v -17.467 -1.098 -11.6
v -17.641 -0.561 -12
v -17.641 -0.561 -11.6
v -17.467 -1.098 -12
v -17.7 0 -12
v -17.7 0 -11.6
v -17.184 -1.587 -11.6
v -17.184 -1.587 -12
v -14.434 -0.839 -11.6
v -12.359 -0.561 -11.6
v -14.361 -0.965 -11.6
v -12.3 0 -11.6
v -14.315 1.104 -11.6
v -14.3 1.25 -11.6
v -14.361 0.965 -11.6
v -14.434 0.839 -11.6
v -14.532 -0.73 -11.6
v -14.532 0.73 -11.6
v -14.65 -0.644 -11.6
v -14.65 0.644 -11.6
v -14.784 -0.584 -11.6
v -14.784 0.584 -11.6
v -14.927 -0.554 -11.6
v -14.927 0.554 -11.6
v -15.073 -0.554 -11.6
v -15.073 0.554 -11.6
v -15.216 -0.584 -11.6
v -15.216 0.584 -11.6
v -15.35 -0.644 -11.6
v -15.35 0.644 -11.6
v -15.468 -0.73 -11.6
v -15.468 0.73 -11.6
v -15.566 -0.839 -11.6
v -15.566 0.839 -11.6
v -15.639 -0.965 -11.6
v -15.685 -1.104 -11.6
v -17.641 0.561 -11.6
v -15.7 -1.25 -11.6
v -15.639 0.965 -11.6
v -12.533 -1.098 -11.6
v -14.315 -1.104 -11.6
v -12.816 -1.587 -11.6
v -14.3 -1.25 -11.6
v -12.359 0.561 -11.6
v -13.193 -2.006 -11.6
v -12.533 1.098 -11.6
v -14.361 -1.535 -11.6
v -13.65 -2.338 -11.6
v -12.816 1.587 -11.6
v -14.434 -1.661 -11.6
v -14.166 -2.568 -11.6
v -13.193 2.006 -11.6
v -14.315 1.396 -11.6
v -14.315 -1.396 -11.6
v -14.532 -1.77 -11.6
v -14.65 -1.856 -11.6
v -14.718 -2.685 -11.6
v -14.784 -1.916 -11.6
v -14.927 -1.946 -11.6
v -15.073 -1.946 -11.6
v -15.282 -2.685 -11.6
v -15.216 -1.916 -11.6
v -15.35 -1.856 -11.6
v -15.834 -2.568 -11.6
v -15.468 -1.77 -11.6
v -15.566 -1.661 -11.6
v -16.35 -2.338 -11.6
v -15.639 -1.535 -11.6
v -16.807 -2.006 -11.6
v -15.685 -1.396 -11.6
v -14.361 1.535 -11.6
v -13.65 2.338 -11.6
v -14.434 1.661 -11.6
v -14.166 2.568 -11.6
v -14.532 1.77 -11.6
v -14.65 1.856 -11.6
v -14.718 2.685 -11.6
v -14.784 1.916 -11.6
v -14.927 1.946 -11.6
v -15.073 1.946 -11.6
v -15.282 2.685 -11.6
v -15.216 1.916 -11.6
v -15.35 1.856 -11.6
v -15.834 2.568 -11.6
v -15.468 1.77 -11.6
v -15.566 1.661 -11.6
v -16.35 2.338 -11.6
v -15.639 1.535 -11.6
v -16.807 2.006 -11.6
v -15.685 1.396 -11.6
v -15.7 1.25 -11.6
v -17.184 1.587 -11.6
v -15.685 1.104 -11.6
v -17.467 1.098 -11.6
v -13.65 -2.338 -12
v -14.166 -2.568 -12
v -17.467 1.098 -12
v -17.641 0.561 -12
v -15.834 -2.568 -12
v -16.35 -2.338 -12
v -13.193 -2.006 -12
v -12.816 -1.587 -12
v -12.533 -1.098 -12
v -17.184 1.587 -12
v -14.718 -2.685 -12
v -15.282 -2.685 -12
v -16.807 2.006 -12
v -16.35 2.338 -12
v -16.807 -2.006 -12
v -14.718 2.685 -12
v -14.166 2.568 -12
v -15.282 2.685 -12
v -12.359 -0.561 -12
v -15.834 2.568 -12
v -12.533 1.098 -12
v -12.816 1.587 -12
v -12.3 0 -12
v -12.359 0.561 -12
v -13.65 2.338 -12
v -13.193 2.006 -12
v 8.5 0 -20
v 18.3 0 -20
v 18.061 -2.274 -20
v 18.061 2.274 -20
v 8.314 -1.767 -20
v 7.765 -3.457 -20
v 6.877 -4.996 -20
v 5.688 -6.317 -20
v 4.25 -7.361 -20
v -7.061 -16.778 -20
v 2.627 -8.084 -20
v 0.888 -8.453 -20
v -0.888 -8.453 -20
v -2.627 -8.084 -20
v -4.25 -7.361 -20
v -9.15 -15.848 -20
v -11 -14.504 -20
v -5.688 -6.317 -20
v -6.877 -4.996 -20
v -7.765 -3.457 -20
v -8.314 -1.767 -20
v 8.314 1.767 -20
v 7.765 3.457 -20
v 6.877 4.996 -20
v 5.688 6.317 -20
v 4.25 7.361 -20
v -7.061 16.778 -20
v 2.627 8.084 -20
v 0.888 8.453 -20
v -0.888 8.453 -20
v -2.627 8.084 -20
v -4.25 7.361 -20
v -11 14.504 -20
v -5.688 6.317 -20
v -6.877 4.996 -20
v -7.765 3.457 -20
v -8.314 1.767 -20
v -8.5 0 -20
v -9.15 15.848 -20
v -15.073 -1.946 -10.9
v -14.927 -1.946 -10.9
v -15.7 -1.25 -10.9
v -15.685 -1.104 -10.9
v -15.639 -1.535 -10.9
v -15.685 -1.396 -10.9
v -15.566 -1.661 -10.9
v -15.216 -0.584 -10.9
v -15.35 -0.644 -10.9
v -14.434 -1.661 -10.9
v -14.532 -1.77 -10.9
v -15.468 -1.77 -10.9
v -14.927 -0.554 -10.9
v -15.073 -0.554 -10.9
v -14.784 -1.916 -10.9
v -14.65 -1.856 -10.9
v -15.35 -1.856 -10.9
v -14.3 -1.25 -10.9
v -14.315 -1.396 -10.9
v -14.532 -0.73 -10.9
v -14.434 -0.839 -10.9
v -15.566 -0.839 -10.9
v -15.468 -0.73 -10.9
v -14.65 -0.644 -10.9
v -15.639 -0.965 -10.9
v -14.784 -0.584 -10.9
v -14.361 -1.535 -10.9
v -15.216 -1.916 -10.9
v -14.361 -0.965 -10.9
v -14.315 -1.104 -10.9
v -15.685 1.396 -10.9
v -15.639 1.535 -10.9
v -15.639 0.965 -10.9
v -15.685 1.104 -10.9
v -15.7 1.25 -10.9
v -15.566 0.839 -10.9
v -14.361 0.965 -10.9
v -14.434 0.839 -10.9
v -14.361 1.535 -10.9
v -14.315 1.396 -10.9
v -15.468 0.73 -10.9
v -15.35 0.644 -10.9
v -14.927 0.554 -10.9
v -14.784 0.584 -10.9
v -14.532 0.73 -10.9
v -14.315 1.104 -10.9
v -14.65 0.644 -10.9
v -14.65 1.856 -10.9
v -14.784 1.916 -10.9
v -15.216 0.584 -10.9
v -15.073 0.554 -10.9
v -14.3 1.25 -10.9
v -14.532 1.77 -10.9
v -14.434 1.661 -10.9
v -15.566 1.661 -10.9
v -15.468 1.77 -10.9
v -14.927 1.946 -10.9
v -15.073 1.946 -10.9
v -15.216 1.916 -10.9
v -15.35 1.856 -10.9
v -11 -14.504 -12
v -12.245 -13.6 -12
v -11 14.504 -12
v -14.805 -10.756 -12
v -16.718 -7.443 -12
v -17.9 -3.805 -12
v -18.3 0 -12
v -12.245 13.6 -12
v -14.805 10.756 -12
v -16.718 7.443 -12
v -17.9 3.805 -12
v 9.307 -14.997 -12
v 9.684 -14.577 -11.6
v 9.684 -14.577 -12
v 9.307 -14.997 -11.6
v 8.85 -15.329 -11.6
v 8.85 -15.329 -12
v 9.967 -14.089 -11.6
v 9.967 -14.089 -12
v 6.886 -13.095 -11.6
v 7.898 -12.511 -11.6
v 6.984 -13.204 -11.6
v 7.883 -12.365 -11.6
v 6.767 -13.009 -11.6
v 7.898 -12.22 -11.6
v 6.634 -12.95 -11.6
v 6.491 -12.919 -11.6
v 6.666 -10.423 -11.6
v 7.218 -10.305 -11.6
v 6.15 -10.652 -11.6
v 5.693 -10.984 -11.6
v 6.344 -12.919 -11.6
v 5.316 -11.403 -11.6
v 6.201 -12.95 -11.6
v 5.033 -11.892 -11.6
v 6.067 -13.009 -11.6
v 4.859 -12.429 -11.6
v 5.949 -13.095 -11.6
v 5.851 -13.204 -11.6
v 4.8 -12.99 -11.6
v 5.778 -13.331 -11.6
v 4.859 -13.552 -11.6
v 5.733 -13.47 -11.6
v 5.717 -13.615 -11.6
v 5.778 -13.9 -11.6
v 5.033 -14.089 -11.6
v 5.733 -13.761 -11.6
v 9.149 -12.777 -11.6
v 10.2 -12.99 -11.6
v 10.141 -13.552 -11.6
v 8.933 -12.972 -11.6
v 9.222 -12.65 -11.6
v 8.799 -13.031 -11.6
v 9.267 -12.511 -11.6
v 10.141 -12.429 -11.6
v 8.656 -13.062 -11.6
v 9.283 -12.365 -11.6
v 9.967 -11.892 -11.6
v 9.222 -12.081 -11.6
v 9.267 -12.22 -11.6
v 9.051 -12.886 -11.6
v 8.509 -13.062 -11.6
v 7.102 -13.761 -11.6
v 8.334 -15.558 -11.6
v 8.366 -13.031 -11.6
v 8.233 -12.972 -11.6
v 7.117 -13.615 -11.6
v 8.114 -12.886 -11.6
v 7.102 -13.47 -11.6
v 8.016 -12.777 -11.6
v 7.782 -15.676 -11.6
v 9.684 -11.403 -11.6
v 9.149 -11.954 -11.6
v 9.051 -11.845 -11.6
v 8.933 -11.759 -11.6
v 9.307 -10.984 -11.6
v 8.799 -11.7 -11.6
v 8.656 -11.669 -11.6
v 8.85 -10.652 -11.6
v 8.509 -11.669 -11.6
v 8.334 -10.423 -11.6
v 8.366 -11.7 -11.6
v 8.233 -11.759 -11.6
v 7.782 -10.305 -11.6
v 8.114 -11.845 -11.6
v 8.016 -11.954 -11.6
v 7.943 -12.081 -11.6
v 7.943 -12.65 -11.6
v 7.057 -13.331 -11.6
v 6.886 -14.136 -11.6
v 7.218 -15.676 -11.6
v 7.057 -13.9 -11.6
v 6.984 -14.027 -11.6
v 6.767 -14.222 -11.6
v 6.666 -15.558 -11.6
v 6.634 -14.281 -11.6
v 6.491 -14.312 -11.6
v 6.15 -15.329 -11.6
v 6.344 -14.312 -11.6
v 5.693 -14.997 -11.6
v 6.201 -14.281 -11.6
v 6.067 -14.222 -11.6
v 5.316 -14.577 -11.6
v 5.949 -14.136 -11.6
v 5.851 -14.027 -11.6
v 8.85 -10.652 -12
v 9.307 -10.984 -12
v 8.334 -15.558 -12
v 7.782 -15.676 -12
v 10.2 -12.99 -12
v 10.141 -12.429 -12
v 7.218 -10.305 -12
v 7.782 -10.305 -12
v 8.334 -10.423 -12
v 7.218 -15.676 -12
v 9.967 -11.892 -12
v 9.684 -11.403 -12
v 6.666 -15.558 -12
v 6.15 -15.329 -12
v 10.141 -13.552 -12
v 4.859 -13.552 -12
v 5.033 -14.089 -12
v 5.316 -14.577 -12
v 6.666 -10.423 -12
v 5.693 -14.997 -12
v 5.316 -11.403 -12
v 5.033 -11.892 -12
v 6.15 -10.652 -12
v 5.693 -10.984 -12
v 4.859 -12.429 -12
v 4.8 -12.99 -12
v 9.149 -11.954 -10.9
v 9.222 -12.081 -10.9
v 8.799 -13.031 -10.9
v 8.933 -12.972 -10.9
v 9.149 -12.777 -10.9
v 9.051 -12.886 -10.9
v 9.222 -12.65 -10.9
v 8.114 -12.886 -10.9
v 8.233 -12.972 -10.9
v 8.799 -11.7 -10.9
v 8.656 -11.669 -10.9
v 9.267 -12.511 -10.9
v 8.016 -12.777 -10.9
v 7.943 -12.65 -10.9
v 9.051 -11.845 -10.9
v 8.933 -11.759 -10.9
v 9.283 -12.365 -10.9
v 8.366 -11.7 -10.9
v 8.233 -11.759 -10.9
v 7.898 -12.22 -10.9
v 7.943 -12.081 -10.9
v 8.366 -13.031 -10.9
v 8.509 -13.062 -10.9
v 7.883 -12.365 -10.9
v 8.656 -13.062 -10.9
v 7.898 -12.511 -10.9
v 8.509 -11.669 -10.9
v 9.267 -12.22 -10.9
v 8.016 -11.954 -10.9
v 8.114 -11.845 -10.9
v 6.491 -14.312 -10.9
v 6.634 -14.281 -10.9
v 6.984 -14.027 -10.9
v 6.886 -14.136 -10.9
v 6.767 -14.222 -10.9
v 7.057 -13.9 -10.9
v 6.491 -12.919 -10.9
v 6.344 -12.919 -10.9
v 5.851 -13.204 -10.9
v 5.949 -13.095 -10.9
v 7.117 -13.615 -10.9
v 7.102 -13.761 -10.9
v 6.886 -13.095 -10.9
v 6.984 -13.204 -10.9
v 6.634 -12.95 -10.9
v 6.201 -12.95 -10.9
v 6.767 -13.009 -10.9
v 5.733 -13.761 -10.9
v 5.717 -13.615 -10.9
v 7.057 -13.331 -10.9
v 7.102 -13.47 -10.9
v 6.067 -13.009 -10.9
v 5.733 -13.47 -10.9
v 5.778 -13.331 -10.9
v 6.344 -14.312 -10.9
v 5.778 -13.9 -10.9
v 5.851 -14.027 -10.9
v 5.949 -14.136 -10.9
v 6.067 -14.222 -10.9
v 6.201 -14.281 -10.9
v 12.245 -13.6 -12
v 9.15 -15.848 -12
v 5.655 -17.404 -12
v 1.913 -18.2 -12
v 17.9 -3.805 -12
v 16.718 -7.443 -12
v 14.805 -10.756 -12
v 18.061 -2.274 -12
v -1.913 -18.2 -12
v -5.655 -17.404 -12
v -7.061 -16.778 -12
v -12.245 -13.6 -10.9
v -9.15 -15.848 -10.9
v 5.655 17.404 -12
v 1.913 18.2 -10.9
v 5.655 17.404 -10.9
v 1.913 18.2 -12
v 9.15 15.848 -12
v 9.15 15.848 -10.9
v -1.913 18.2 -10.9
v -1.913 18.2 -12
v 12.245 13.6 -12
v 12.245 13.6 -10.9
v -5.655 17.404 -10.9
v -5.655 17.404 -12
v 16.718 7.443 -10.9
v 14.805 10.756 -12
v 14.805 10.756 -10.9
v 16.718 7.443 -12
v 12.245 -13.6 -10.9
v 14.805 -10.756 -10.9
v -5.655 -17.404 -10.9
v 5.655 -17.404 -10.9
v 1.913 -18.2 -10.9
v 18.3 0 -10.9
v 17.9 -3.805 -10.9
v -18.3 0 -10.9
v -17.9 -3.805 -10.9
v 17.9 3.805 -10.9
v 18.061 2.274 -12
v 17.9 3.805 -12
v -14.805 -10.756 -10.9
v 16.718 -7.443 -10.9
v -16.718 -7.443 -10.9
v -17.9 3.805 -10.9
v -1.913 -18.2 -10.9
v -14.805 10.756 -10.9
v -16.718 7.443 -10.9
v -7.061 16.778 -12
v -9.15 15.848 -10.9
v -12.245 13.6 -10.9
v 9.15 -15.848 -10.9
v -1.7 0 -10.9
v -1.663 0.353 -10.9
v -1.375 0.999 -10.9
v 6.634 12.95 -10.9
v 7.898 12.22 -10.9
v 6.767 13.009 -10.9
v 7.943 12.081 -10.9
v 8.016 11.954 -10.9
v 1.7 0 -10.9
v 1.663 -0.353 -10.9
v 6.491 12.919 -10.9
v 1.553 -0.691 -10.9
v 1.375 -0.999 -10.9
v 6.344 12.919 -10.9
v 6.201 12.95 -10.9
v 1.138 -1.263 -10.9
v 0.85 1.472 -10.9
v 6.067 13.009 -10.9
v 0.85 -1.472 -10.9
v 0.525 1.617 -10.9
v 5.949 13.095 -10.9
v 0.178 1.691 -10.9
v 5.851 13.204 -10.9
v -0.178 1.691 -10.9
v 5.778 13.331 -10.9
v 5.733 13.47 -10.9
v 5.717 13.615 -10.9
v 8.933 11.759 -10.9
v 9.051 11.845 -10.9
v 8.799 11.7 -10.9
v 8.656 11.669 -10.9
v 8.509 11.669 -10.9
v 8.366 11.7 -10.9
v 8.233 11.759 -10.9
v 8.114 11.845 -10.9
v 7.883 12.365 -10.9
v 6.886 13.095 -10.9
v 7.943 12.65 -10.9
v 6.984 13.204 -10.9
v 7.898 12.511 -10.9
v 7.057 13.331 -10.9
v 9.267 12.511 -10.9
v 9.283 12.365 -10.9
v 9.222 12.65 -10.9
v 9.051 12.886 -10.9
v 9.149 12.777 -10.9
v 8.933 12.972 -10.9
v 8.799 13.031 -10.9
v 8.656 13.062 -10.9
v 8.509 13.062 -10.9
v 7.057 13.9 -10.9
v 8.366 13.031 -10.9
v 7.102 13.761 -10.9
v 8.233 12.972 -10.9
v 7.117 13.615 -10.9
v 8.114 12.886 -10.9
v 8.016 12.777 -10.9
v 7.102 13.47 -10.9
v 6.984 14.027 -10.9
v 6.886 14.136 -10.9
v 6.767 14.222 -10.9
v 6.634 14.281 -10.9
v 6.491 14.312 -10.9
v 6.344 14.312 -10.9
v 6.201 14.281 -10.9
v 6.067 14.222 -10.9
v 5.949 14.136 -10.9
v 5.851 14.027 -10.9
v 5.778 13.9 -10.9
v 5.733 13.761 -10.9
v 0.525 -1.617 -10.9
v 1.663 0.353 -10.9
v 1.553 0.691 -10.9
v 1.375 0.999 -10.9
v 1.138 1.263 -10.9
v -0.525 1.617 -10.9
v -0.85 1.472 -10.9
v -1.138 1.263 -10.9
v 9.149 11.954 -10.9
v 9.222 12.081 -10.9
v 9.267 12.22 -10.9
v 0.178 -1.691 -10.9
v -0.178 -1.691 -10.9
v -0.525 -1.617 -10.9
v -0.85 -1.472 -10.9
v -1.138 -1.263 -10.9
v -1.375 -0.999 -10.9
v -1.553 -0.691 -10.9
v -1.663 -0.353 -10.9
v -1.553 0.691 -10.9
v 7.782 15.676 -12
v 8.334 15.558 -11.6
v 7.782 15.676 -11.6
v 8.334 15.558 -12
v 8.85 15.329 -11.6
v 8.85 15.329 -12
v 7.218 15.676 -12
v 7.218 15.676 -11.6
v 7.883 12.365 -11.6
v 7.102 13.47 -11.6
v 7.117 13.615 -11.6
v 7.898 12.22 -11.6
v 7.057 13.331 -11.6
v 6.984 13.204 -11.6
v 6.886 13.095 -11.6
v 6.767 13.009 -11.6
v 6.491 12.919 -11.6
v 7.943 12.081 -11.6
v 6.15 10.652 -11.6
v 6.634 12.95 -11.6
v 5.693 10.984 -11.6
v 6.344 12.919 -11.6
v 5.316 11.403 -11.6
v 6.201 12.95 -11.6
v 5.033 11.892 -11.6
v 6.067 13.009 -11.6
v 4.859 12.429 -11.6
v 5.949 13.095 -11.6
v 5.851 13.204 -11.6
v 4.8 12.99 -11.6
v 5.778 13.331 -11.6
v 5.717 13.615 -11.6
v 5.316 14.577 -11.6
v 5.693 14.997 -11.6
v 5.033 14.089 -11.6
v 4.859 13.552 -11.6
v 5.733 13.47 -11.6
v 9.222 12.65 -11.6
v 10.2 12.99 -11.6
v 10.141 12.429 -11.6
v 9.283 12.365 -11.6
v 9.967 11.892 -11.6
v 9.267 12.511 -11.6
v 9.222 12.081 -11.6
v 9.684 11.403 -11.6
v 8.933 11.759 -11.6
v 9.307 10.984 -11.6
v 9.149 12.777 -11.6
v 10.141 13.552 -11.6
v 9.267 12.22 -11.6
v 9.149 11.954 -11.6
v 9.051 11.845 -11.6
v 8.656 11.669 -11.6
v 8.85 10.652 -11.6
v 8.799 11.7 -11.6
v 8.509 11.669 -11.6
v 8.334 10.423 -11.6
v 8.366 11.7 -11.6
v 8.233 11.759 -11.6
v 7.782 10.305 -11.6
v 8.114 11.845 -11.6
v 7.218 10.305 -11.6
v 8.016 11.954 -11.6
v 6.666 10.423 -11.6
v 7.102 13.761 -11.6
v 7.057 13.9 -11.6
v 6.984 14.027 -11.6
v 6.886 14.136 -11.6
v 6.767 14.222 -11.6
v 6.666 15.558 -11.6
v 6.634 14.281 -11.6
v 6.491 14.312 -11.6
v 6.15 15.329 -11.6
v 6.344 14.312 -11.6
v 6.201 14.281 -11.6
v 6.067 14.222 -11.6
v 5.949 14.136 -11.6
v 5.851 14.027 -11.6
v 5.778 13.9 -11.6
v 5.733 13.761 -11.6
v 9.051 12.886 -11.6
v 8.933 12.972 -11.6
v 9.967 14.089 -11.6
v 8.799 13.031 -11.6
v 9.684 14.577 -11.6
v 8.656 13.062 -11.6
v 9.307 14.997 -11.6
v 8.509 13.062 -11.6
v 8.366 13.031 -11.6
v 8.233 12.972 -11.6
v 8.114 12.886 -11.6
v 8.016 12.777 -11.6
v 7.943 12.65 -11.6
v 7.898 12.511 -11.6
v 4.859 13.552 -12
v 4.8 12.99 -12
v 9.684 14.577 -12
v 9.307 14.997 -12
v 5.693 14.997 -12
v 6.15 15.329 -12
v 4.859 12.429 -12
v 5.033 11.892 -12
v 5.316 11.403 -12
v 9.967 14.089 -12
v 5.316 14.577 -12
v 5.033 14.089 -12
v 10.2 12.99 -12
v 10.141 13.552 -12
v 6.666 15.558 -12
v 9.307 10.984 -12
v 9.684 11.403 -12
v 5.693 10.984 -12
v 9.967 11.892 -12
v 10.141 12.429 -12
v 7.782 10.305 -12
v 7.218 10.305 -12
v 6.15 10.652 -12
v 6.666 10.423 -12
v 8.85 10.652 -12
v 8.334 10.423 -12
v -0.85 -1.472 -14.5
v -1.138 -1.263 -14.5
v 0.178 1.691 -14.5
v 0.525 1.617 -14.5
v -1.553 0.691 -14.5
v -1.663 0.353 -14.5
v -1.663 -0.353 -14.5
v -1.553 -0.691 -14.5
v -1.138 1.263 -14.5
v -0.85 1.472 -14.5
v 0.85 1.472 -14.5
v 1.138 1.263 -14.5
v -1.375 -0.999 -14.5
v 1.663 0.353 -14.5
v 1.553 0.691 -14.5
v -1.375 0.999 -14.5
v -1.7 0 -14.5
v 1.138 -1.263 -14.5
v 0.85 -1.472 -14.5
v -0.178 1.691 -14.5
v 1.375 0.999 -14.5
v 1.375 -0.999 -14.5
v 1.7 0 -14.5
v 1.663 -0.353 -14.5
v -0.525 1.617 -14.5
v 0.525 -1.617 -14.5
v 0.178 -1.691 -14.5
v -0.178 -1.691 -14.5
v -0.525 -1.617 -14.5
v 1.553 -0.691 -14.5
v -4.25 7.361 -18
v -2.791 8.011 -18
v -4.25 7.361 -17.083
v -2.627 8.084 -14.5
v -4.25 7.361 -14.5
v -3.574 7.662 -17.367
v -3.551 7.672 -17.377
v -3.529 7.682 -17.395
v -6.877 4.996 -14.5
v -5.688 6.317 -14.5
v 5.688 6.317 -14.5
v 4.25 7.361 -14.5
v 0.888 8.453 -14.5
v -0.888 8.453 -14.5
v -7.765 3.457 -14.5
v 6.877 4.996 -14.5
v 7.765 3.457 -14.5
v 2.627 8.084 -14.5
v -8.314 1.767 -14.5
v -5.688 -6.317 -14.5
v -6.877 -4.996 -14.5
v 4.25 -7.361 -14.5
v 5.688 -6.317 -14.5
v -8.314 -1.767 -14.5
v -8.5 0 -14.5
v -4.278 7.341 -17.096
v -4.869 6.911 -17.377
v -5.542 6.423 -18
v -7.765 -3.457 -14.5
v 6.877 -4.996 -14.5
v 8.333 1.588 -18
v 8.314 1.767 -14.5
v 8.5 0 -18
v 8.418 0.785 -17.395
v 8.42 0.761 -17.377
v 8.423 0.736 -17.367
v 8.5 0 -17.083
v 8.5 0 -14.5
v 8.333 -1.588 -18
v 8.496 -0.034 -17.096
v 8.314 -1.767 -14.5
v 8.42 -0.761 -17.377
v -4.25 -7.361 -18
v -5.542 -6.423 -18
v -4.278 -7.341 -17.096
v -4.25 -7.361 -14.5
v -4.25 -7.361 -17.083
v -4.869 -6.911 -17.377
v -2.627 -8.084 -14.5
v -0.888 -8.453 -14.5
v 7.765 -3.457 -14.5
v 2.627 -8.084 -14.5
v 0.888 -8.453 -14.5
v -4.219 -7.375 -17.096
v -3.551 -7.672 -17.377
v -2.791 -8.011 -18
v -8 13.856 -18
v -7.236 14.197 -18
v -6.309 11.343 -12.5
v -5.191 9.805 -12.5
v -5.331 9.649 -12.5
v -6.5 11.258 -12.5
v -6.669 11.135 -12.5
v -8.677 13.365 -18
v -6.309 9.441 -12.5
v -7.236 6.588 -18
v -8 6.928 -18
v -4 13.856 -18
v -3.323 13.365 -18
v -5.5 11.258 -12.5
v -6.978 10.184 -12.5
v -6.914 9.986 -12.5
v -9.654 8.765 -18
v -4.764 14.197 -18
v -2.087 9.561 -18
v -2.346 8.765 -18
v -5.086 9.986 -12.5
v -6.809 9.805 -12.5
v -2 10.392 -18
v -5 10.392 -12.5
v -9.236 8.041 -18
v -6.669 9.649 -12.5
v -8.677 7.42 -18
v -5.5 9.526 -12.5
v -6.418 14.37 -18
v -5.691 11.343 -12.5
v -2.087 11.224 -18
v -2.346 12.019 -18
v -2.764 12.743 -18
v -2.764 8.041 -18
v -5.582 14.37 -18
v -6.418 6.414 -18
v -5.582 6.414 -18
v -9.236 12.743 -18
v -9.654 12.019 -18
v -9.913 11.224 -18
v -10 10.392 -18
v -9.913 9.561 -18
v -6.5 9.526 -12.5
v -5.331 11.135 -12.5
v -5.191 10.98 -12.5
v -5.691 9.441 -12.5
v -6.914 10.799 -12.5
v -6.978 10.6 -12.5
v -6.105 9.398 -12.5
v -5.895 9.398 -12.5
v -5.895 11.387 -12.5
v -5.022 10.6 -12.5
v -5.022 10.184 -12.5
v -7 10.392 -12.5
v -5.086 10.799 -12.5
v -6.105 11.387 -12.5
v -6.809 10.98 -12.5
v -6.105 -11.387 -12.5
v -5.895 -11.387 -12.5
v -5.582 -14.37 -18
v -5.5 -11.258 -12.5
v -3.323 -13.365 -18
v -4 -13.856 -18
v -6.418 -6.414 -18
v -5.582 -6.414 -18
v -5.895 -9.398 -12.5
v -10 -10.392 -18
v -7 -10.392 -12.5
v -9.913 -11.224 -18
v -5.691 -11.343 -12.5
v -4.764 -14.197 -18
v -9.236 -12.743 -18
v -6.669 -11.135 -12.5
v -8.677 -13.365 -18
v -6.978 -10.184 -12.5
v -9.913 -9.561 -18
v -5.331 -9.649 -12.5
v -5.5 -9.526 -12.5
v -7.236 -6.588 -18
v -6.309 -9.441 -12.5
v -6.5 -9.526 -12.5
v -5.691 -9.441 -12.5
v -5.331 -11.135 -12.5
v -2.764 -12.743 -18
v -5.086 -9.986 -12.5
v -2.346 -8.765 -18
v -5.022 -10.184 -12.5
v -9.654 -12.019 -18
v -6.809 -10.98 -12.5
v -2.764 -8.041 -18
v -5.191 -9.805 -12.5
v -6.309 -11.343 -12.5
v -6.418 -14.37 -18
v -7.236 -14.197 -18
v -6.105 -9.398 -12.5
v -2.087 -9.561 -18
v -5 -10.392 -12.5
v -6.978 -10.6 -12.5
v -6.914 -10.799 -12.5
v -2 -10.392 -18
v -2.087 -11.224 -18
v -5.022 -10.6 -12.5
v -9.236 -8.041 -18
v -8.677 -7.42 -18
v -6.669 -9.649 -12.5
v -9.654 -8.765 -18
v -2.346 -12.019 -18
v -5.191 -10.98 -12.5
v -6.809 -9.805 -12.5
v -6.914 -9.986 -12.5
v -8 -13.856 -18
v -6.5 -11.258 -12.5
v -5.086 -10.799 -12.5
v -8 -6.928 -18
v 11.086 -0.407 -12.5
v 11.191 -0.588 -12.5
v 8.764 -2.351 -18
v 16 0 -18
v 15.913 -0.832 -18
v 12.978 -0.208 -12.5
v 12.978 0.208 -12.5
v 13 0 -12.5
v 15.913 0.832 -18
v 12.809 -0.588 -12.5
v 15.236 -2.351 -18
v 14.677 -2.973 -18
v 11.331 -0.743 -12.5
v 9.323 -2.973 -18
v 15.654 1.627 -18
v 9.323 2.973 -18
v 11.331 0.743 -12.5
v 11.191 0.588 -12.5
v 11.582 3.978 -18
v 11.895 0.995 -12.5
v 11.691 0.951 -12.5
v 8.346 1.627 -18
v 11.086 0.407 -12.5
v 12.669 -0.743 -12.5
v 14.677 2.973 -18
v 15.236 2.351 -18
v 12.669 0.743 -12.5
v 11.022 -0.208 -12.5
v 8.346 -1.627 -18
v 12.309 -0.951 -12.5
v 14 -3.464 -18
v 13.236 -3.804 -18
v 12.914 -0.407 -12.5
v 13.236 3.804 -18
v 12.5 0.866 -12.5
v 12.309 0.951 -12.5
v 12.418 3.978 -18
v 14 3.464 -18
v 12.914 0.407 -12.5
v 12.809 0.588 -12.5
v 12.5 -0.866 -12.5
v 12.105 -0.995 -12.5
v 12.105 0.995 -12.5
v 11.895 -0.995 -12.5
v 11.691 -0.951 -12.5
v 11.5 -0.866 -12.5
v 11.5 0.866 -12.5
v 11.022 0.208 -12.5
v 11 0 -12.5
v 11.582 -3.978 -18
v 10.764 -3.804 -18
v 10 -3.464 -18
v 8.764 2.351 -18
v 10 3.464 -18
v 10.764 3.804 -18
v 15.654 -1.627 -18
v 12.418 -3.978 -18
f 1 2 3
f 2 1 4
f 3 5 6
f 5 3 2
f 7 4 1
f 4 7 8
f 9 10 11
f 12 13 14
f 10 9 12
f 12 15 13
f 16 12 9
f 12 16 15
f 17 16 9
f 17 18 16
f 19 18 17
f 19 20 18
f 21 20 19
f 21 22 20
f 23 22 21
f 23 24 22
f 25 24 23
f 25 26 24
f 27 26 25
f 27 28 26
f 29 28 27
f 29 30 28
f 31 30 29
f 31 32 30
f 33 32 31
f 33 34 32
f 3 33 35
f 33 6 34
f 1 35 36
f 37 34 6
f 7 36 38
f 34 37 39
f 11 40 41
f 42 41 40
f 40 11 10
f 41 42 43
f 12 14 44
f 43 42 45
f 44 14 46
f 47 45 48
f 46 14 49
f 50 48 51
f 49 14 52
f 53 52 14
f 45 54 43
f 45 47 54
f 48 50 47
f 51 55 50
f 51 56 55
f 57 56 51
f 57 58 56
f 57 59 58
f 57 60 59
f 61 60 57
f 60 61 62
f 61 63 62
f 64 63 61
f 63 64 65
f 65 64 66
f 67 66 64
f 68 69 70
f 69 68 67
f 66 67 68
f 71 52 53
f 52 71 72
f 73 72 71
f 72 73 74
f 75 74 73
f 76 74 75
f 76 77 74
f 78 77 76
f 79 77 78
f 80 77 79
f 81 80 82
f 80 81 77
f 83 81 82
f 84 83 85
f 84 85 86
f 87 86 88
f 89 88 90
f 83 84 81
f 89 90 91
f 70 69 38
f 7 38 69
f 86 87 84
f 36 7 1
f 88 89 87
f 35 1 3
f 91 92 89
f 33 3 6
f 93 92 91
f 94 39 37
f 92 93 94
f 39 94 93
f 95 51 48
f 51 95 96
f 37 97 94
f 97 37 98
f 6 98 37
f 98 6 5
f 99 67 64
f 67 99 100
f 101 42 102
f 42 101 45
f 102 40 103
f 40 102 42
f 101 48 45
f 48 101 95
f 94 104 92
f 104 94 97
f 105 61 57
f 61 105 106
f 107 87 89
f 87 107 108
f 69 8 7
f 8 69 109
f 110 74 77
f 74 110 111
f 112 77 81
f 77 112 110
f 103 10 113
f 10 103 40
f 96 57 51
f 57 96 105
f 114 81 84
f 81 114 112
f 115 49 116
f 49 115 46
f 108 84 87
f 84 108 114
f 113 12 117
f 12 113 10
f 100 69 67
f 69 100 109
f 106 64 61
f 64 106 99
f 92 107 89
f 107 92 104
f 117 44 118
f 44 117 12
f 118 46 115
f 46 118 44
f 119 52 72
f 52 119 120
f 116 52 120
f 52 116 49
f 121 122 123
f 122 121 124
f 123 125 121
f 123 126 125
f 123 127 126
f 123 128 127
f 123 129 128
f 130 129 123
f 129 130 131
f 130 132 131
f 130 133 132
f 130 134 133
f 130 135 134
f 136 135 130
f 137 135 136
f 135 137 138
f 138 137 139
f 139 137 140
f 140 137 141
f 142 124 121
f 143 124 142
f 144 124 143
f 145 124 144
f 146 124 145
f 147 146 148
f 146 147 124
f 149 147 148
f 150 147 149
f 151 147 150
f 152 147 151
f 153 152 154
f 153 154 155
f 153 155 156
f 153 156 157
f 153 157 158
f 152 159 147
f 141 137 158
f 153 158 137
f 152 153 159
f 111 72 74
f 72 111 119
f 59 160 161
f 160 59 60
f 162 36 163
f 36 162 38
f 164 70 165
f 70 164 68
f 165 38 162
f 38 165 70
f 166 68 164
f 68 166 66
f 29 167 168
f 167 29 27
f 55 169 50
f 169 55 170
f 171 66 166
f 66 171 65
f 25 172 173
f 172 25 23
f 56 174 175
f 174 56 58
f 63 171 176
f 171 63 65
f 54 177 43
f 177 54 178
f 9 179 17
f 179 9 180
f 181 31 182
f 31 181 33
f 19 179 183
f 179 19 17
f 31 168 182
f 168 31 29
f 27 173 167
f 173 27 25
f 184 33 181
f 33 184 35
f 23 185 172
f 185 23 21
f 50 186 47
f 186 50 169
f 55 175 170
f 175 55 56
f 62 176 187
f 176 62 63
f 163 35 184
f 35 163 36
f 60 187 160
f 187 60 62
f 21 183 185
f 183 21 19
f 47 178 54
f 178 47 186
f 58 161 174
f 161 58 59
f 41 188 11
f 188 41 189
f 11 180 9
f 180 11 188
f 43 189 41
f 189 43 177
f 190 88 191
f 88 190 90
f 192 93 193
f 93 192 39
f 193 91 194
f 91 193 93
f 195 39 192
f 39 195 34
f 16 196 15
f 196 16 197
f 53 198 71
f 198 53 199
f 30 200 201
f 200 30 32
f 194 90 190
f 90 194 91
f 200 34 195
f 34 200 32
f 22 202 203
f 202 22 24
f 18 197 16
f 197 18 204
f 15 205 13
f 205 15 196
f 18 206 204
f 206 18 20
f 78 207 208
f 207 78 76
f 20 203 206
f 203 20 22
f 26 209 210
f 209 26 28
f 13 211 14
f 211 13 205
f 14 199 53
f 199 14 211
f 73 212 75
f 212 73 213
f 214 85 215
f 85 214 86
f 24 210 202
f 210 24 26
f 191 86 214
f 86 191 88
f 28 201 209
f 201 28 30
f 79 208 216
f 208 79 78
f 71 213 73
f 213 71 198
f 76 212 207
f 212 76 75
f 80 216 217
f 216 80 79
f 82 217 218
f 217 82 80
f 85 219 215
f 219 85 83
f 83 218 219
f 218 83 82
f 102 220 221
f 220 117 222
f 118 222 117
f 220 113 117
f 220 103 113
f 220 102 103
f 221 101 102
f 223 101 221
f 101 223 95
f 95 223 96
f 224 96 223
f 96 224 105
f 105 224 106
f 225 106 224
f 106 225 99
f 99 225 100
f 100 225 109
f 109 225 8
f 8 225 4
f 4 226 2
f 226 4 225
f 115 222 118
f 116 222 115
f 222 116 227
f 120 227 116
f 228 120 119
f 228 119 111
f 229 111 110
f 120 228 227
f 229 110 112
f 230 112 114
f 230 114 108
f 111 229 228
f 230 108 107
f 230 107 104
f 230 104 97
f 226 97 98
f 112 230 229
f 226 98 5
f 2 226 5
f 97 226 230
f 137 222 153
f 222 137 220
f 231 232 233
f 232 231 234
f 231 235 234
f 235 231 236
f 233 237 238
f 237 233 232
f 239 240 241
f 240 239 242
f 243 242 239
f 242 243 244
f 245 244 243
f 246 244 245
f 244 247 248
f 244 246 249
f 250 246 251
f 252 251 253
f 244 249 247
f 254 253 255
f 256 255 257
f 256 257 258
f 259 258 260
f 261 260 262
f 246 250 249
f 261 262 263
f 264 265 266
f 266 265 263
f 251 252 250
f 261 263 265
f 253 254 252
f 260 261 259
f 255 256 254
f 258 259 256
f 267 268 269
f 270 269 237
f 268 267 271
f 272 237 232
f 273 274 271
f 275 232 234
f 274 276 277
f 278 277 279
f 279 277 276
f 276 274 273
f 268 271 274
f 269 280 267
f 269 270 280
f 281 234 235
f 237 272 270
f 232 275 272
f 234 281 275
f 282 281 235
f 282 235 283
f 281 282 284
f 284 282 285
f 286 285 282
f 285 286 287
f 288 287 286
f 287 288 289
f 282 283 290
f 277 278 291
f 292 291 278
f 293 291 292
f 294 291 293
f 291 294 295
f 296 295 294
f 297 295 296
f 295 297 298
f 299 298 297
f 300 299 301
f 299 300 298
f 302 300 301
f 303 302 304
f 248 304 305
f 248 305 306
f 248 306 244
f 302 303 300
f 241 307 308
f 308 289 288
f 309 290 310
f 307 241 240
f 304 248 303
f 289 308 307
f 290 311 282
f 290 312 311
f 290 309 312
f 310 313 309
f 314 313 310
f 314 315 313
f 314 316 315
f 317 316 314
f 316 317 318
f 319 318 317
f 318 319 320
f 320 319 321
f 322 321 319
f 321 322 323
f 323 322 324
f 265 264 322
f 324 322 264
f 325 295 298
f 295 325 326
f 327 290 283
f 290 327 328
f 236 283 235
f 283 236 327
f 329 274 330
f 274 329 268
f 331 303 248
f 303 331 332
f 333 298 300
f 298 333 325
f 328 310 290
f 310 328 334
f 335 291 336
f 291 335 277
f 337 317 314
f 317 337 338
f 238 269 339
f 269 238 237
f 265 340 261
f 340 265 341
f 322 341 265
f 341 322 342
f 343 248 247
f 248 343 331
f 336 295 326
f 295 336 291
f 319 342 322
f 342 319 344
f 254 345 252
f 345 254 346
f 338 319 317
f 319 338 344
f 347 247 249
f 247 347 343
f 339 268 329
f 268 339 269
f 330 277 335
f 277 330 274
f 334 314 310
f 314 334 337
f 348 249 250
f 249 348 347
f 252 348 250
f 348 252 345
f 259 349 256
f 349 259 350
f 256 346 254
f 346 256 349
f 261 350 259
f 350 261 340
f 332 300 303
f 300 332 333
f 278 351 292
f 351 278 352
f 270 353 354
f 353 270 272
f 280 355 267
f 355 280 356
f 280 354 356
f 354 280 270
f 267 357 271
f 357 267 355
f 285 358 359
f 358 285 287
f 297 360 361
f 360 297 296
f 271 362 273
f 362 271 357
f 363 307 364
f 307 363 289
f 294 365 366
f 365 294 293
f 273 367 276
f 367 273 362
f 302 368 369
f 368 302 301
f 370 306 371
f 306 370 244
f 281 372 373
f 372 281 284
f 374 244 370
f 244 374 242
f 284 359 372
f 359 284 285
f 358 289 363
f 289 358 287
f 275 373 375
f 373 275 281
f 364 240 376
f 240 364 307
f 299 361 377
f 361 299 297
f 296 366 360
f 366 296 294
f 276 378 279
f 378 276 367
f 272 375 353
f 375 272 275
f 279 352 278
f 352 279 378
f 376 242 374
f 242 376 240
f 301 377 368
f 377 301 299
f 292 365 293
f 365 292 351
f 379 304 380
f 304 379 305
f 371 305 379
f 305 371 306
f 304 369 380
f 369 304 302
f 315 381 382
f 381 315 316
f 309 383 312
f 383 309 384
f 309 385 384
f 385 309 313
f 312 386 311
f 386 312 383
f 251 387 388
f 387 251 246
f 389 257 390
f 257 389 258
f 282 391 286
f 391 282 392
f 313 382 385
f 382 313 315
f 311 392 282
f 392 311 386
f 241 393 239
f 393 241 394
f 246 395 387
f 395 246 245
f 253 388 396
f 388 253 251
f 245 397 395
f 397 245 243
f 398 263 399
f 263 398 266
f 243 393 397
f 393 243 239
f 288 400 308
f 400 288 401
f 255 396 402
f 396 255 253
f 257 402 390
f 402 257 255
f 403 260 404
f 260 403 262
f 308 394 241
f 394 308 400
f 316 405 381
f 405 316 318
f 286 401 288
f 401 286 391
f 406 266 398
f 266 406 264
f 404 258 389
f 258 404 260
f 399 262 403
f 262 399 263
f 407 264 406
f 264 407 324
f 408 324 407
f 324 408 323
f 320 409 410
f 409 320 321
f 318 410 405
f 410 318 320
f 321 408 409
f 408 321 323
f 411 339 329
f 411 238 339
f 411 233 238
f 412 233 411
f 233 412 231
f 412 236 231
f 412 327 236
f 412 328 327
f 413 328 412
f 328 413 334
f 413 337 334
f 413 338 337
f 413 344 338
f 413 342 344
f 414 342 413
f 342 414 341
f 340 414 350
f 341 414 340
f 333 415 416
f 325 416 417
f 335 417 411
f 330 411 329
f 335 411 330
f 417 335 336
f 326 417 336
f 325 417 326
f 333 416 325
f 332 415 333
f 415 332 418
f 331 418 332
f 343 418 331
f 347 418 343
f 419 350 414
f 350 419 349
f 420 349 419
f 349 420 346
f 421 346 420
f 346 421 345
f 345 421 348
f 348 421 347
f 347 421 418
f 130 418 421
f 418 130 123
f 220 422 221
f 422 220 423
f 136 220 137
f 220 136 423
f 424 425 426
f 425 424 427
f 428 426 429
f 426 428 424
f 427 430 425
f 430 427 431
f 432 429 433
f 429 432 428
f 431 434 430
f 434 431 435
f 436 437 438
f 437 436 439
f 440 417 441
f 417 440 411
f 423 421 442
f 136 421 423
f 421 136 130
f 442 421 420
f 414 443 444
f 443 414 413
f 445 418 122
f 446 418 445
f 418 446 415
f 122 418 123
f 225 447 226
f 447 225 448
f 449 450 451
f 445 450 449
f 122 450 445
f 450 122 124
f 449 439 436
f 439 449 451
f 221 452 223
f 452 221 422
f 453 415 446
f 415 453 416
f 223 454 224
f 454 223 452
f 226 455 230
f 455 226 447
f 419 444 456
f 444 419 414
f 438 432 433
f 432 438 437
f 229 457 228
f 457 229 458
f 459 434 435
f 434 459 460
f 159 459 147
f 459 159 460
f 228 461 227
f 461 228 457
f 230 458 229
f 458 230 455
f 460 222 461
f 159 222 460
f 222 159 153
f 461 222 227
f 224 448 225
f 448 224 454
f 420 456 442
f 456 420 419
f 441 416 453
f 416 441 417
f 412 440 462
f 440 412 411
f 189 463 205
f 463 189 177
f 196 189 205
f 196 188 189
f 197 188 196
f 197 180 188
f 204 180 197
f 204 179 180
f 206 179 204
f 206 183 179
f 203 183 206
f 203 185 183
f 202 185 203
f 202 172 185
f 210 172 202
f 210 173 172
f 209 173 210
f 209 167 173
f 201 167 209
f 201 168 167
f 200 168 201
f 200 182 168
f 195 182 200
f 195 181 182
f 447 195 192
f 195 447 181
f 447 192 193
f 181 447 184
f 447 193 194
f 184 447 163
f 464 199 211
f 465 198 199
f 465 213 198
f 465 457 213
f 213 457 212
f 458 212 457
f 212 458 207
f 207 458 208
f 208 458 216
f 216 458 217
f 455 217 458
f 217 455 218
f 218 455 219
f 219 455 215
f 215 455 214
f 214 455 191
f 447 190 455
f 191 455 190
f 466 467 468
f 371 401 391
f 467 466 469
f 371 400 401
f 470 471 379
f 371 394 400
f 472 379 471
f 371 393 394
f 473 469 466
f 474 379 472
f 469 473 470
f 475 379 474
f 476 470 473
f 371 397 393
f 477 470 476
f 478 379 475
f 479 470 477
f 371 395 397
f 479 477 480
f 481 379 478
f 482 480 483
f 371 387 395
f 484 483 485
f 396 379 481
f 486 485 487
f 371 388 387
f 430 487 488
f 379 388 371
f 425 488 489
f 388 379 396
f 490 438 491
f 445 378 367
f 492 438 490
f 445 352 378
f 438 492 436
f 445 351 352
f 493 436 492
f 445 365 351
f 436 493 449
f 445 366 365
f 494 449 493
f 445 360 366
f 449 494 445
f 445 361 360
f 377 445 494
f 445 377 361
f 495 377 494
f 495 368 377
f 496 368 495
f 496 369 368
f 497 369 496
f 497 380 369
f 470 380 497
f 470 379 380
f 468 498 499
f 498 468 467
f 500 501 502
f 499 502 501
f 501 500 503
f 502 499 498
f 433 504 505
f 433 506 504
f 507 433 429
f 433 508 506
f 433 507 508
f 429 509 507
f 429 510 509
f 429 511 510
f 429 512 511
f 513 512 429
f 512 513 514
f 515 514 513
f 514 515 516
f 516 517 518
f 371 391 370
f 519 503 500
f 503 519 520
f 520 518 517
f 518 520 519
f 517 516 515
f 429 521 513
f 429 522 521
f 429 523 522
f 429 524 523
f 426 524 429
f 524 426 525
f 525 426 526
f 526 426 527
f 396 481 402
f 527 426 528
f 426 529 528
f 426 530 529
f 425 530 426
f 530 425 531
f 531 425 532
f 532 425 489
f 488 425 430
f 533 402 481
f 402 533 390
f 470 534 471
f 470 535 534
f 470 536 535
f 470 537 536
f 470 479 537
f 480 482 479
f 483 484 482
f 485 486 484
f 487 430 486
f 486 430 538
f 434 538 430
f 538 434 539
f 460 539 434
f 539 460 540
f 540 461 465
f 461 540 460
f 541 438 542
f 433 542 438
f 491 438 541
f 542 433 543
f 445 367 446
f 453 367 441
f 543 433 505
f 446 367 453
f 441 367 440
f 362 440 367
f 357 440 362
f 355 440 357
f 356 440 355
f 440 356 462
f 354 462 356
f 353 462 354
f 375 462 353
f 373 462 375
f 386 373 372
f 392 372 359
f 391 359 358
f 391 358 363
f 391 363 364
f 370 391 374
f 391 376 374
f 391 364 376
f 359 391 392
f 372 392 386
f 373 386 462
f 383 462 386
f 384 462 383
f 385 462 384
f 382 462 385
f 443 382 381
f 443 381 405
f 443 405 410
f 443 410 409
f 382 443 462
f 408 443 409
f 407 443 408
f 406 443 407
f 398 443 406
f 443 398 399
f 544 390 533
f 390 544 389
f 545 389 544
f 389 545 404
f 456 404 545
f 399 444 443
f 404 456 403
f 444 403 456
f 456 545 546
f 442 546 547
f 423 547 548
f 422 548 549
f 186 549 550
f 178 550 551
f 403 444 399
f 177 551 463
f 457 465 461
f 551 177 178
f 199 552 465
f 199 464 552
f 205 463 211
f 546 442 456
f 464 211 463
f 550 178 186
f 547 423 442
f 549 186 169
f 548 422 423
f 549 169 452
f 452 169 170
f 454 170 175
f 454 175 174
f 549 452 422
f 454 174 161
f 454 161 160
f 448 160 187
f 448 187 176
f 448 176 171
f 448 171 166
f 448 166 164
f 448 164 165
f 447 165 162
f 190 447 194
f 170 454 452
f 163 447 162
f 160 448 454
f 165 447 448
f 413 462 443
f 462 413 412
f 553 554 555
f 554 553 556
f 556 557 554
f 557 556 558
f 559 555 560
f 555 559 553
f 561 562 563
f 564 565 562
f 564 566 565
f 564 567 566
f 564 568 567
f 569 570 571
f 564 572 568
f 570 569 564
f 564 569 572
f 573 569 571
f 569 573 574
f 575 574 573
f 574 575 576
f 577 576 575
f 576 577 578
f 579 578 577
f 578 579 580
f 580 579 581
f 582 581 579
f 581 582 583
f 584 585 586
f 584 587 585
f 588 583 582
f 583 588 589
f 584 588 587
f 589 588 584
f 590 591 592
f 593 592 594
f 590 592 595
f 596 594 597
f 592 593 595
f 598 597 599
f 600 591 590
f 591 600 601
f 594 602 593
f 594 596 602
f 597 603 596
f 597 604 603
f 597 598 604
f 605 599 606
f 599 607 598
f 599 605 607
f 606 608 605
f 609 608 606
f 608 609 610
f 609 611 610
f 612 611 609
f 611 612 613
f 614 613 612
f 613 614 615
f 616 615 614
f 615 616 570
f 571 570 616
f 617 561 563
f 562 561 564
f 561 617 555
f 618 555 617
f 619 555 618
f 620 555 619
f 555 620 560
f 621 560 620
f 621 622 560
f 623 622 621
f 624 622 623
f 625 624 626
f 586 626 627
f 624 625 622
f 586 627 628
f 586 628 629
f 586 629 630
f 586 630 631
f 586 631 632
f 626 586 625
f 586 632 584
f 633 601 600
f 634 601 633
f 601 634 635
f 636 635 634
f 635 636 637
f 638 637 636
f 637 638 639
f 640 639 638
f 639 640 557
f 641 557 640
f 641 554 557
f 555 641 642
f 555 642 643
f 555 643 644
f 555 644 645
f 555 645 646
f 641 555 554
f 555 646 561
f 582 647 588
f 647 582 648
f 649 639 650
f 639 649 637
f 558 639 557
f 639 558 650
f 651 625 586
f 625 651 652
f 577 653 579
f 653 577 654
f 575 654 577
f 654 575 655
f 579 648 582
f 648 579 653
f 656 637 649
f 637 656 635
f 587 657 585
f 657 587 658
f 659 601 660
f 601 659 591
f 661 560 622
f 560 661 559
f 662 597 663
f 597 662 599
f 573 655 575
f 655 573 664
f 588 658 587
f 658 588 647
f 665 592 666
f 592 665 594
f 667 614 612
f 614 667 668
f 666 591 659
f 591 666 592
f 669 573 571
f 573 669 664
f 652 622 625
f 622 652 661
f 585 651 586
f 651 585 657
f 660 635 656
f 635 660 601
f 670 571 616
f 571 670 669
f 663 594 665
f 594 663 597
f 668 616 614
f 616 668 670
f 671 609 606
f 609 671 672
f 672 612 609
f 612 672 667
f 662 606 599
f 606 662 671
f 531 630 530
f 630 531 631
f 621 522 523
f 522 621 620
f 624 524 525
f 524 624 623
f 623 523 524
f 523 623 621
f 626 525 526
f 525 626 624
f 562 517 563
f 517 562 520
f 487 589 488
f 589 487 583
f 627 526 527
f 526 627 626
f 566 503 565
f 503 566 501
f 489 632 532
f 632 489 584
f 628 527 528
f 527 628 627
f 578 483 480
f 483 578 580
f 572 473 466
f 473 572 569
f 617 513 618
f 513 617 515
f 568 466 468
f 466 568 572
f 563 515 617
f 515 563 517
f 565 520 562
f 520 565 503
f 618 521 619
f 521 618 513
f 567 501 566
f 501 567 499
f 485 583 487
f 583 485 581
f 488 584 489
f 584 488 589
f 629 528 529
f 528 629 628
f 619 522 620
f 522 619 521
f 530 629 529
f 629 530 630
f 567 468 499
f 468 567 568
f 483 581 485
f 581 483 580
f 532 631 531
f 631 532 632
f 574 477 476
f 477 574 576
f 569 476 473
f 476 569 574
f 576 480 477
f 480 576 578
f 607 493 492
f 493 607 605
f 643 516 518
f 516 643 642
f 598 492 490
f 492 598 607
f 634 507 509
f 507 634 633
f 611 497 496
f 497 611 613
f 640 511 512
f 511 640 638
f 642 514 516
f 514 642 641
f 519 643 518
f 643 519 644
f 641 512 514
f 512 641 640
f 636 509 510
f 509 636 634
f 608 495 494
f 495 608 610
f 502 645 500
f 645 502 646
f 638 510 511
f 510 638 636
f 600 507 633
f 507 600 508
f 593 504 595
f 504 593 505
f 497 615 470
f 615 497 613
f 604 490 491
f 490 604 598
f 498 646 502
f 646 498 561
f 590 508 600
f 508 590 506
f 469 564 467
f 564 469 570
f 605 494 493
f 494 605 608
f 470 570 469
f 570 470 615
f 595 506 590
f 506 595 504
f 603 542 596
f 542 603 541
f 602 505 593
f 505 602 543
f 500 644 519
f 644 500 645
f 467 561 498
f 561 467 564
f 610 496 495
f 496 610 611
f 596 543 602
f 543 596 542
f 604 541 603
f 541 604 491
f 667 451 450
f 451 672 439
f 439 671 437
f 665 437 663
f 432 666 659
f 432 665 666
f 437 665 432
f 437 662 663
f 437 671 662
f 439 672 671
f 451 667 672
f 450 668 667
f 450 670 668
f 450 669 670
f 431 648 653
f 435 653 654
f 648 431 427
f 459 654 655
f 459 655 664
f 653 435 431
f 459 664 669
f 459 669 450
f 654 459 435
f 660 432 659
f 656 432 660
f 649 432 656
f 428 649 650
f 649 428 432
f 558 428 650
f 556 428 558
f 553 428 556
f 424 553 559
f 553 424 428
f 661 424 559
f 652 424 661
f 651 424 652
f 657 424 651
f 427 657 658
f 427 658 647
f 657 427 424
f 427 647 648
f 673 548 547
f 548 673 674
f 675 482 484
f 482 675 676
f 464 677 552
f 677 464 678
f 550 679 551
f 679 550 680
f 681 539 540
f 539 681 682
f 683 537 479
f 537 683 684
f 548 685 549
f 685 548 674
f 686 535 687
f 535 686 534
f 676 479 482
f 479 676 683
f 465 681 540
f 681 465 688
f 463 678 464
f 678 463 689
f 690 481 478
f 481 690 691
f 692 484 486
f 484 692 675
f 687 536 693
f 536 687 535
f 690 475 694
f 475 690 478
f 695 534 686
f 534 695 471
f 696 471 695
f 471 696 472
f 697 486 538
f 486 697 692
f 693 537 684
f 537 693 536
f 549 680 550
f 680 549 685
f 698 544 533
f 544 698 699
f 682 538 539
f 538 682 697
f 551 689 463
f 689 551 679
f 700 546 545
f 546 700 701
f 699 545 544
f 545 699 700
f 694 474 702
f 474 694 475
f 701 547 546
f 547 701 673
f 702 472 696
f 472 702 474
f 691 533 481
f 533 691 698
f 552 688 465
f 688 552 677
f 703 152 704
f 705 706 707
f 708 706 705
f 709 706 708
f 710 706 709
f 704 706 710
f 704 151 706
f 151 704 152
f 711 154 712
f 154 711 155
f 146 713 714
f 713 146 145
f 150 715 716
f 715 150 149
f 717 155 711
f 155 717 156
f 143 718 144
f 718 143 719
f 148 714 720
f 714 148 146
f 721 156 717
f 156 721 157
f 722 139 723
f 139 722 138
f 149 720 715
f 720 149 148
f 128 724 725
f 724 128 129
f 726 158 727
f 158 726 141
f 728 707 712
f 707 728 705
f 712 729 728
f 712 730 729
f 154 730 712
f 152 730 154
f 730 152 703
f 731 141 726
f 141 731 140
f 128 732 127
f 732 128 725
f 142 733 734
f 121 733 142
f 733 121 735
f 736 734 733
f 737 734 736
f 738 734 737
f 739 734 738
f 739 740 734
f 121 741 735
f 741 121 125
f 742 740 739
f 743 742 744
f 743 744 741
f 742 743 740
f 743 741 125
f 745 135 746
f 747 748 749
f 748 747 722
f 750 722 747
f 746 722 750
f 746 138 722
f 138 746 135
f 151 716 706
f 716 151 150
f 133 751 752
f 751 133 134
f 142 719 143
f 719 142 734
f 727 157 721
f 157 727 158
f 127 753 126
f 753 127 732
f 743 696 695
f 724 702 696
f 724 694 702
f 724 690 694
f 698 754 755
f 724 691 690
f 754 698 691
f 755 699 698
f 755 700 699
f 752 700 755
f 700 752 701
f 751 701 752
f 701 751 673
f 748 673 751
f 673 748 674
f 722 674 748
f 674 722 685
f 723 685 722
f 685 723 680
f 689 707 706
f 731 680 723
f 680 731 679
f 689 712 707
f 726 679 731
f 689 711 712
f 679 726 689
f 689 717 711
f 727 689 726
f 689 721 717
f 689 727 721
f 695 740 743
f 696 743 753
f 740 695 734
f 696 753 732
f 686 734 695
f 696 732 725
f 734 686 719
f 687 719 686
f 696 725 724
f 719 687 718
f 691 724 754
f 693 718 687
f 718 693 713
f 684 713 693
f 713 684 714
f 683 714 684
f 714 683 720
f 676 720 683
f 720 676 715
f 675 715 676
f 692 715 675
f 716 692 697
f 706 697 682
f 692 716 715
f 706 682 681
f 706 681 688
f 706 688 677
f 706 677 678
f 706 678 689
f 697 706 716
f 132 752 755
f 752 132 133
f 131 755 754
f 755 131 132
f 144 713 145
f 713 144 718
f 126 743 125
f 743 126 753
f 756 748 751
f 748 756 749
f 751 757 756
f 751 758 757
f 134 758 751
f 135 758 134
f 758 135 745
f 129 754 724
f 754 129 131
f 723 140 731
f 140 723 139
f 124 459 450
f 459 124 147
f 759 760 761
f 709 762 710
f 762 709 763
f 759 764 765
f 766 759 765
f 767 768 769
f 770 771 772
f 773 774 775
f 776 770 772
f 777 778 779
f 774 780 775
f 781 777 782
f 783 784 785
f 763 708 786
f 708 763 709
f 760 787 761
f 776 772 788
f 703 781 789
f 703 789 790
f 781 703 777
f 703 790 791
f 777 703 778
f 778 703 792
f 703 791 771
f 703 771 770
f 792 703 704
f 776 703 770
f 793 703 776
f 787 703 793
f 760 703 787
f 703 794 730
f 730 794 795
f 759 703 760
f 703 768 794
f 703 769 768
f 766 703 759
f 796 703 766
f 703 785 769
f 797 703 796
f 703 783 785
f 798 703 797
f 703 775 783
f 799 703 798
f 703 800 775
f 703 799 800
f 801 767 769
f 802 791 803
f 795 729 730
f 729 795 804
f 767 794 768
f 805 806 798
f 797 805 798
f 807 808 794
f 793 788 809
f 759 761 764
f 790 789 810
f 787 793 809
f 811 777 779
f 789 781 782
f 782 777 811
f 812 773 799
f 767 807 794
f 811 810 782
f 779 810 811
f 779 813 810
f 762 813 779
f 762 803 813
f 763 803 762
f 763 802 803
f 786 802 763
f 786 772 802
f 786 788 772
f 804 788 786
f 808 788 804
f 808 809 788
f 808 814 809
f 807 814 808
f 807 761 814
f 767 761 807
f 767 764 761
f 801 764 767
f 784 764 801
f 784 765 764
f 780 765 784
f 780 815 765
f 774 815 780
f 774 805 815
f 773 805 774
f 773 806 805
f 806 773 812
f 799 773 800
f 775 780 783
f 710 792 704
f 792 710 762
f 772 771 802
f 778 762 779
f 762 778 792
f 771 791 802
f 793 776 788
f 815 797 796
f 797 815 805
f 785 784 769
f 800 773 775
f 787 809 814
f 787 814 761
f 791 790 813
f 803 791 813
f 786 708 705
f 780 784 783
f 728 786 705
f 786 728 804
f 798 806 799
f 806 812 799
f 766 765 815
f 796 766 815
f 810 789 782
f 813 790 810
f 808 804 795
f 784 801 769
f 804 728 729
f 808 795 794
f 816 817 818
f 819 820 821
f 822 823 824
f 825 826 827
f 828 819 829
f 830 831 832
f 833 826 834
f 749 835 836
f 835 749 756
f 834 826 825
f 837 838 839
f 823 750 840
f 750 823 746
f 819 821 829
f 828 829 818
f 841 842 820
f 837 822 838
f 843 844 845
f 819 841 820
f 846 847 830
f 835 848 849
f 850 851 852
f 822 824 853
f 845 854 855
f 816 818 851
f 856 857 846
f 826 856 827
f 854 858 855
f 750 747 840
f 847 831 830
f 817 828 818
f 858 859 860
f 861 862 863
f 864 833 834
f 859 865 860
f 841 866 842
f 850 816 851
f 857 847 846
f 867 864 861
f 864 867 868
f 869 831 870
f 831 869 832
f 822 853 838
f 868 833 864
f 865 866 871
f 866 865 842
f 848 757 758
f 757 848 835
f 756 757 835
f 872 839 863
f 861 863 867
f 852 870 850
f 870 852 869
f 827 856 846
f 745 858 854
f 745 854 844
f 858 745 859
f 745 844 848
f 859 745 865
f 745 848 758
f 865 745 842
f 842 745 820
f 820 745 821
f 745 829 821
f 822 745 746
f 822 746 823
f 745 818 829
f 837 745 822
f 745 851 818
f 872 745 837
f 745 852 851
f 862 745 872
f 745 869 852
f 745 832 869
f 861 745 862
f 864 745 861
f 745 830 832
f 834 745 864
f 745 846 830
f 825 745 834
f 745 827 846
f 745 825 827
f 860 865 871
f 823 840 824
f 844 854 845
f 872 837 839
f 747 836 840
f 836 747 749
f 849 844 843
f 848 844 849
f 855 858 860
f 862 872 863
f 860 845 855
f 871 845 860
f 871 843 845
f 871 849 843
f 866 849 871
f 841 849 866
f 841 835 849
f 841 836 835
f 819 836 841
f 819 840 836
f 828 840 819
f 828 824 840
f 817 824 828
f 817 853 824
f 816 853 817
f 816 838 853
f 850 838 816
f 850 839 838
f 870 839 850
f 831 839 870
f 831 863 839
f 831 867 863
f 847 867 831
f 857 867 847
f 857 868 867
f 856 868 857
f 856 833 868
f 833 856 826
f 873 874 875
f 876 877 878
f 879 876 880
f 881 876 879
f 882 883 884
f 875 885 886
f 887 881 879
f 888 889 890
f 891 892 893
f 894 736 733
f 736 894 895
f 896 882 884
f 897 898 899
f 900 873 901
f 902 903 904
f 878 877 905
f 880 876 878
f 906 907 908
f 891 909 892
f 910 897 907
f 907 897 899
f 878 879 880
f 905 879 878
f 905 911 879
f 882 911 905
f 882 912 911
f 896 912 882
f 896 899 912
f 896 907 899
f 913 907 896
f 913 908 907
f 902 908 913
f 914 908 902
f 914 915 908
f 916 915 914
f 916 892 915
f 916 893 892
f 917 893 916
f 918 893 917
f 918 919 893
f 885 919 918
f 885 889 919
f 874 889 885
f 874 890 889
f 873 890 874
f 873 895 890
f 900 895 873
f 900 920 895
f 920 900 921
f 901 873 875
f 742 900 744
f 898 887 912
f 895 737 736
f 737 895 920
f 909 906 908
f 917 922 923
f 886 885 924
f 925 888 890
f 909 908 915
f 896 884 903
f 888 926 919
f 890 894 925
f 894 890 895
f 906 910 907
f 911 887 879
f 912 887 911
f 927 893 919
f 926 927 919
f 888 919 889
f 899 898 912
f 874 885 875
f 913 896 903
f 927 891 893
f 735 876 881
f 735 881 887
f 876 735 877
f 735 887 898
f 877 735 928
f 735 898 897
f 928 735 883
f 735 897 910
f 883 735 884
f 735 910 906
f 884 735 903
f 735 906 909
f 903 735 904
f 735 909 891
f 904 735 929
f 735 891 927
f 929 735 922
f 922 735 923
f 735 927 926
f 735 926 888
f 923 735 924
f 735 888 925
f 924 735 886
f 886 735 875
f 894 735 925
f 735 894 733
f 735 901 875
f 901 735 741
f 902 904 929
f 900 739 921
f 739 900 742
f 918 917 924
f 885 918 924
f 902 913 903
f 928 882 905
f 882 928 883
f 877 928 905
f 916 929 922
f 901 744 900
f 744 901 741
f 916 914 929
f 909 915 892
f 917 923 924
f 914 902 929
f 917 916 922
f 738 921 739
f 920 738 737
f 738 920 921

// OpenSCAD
//////////////////////////////////////////////
//  ***TeMoG - Tentacle Mold Generator***   //
//  by Jonas Jørgensen (jonj@sdu.dk) 2020   //
//                                          //
//  Shared under a Creative Commons         //
//  Attribution-ShareAlike (CC BY-SA 3.0)   //
//  license                                 //
//////////////////////////////////////////////

//Part 3c - Top Piece - LDR holder version (used for "Phytomatonic 01" - described under case studies in the instruction manual)

$fn=30; //Set to 200 when generating the molds for 3D printing

//Main cone and mold
h = 180; //Cone height
maxDiam = 45; //Cone
minDiam = 35; //Cone
centerSolidDiam=15;
moldWallThickness = 3;
footDiam=100; //Foot for mold
siliconeThickness=3; //Outer
dividersThickness = 5;

////Assembly on the sides of mold////
numberOfHoles = 4;
screwSize=5;
assemblyWidth= 22;

//Bottom
straightHeightBottom = 20;
bottomThickness=4;
LDRHolderThickness= 10-0.5;
LDRHolderDiam= minDiam+3-1;
delta=0.4; //Inaccuracy of printer (layering and overextrusion)
LDRHoleDepth=8;
LDRDiam=5; 
LDRWireHolesDist=2.5;//Distance between wires on LDR
LDRWireHolesSize=1; 
LDRHoleDist = LDRHolderDiam/2-LDRDiam/2-1;
LDRNumber=3;
centerHoleDiam=3; 

//Top part
straightHeight= 30; 
wiresDiameter=5; 

//Joints
jointThickness = 3;

//Finishing mold:
finMoldHeight=25;
finMoldWidth=30;
supportMoldLength=60;
supportMoldWidth=30;
FinalBottomThickness =8;

//Plant part
plantHoleDiam=17;
plantScrewsDiam=3.5;

rotate (60) translate ([0,0,-straightHeightBottom]) difference(){

cylinder(LDRHolderThickness-delta,d2=LDRHolderDiam-delta,d1=LDRHolderDiam-delta);
translate ([LDRHoleDist,0,0]) cylinder(LDRHoleDepth+delta,d2=LDRDiam+delta,d1=LDRDiam+delta);//LDR hole 1
translate ([LDRHoleDist,LDRWireHolesDist/2,0]) cylinder(LDRHolderThickness+delta,d2=LDRWireHolesSize+delta,d1=LDRWireHolesSize+delta); //Wire hole 1
translate ([LDRHoleDist,-LDRWireHolesDist/2,0]) cylinder(LDRHolderThickness+delta,d2=LDRWireHolesSize+delta,d1=LDRWireHolesSize+delta);//Wire hole 1
//Cut of for exposing LDRs to light in the right directions    
translate([LDRHoleDist-LDRDiam/2,-LDRHolderDiam/2,0]) cube([LDRHolderDiam/2, LDRHolderDiam,LDRHoleDepth], [0,0,0]);

rotate (360/LDRNumber, [0,0,1]) {
translate ([LDRHoleDist,0,0]) cylinder(LDRHoleDepth+delta,d2=LDRDiam+delta,d1=LDRDiam+delta);//LDR hole 2
translate ([LDRHoleDist,LDRWireHolesDist/2,0]) cylinder(LDRHolderThickness+delta,d2=LDRWireHolesSize+delta,d1=LDRWireHolesSize+delta); //Wire hole 2
translate ([LDRHoleDist,-LDRWireHolesDist/2,0]) cylinder(LDRHolderThickness+delta,d2=LDRWireHolesSize+delta,d1=LDRWireHolesSize+delta);//Wire hole 2
//Cut of for exposing LDRs to light in the right directions    
translate([LDRHoleDist-LDRDiam+1,-LDRHolderDiam/2,0]) cube([LDRHolderDiam/2, LDRHolderDiam,LDRHoleDepth], [0,0,0]);
    }

rotate (2*360/LDRNumber, [0,0,1]) {
translate ([LDRHoleDist,0,0]) cylinder(LDRHoleDepth+delta,d2=LDRDiam+delta,d1=LDRDiam+delta);//LDR hole 3
translate ([LDRHoleDist,LDRWireHolesDist/2,0]) cylinder(LDRHolderThickness+delta,d2=LDRWireHolesSize+delta,d1=LDRWireHolesSize+delta); //Wire hole 3
translate ([LDRHoleDist,-LDRWireHolesDist/2,0]) cylinder(LDRHolderThickness+delta,d2=LDRWireHolesSize+delta,d1=LDRWireHolesSize+delta);//Wire hole 3
//Cut of for exposing LDRs to light in the right directions    
translate([LDRHoleDist-LDRDiam+1,-LDRHolderDiam/2,0]) cube([LDRHolderDiam/2, LDRHolderDiam,LDRHoleDepth], [0,0,0]);
    }

//CENTER HOLE for thread
cylinder(LDRHolderThickness*2,d2=centerHoleDiam+delta,d1=centerHoleDiam+delta);
    
//CENTER HOLE for plant
translate([0,0,-bottomThickness]) cylinder(LDRHolderThickness,d2=plantHoleDiam,d1=plantHoleDiam);

//Cut of for exposing LDRs to light in the right directions    
translate([LDRHoleDist-LDRDiam+1,-LDRHolderDiam/2,0]) cube([LDRHolderDiam/2, LDRHolderDiam,LDRHoleDepth], [0,0,0]);
   
//Plug hooks to keep EcoFlex attached to PLA
rotate (60) translate ([(plantHoleDiam/2)+(LDRHolderDiam-plantHoleDiam)/4-1.5,0, LDRHolderThickness-(straightHeightBottom-LDRHolderThickness-siliconeThickness)]) cylinder(LDRHolderThickness-bottomThickness, d1=8, d2=2);
rotate (180) translate ([(plantHoleDiam/2)+(LDRHolderDiam-plantHoleDiam)/4-1.5,0, LDRHolderThickness-(straightHeightBottom-LDRHolderThickness-siliconeThickness)]) cylinder(LDRHolderThickness-bottomThickness, d1=8, d2=2);
rotate (300) translate ([(plantHoleDiam/2)+(LDRHolderDiam-plantHoleDiam)/4-1.5,0, LDRHolderThickness-(straightHeightBottom-LDRHolderThickness-siliconeThickness)]) cylinder(LDRHolderThickness-bottomThickness, d1=8, d2=2);
}


    
